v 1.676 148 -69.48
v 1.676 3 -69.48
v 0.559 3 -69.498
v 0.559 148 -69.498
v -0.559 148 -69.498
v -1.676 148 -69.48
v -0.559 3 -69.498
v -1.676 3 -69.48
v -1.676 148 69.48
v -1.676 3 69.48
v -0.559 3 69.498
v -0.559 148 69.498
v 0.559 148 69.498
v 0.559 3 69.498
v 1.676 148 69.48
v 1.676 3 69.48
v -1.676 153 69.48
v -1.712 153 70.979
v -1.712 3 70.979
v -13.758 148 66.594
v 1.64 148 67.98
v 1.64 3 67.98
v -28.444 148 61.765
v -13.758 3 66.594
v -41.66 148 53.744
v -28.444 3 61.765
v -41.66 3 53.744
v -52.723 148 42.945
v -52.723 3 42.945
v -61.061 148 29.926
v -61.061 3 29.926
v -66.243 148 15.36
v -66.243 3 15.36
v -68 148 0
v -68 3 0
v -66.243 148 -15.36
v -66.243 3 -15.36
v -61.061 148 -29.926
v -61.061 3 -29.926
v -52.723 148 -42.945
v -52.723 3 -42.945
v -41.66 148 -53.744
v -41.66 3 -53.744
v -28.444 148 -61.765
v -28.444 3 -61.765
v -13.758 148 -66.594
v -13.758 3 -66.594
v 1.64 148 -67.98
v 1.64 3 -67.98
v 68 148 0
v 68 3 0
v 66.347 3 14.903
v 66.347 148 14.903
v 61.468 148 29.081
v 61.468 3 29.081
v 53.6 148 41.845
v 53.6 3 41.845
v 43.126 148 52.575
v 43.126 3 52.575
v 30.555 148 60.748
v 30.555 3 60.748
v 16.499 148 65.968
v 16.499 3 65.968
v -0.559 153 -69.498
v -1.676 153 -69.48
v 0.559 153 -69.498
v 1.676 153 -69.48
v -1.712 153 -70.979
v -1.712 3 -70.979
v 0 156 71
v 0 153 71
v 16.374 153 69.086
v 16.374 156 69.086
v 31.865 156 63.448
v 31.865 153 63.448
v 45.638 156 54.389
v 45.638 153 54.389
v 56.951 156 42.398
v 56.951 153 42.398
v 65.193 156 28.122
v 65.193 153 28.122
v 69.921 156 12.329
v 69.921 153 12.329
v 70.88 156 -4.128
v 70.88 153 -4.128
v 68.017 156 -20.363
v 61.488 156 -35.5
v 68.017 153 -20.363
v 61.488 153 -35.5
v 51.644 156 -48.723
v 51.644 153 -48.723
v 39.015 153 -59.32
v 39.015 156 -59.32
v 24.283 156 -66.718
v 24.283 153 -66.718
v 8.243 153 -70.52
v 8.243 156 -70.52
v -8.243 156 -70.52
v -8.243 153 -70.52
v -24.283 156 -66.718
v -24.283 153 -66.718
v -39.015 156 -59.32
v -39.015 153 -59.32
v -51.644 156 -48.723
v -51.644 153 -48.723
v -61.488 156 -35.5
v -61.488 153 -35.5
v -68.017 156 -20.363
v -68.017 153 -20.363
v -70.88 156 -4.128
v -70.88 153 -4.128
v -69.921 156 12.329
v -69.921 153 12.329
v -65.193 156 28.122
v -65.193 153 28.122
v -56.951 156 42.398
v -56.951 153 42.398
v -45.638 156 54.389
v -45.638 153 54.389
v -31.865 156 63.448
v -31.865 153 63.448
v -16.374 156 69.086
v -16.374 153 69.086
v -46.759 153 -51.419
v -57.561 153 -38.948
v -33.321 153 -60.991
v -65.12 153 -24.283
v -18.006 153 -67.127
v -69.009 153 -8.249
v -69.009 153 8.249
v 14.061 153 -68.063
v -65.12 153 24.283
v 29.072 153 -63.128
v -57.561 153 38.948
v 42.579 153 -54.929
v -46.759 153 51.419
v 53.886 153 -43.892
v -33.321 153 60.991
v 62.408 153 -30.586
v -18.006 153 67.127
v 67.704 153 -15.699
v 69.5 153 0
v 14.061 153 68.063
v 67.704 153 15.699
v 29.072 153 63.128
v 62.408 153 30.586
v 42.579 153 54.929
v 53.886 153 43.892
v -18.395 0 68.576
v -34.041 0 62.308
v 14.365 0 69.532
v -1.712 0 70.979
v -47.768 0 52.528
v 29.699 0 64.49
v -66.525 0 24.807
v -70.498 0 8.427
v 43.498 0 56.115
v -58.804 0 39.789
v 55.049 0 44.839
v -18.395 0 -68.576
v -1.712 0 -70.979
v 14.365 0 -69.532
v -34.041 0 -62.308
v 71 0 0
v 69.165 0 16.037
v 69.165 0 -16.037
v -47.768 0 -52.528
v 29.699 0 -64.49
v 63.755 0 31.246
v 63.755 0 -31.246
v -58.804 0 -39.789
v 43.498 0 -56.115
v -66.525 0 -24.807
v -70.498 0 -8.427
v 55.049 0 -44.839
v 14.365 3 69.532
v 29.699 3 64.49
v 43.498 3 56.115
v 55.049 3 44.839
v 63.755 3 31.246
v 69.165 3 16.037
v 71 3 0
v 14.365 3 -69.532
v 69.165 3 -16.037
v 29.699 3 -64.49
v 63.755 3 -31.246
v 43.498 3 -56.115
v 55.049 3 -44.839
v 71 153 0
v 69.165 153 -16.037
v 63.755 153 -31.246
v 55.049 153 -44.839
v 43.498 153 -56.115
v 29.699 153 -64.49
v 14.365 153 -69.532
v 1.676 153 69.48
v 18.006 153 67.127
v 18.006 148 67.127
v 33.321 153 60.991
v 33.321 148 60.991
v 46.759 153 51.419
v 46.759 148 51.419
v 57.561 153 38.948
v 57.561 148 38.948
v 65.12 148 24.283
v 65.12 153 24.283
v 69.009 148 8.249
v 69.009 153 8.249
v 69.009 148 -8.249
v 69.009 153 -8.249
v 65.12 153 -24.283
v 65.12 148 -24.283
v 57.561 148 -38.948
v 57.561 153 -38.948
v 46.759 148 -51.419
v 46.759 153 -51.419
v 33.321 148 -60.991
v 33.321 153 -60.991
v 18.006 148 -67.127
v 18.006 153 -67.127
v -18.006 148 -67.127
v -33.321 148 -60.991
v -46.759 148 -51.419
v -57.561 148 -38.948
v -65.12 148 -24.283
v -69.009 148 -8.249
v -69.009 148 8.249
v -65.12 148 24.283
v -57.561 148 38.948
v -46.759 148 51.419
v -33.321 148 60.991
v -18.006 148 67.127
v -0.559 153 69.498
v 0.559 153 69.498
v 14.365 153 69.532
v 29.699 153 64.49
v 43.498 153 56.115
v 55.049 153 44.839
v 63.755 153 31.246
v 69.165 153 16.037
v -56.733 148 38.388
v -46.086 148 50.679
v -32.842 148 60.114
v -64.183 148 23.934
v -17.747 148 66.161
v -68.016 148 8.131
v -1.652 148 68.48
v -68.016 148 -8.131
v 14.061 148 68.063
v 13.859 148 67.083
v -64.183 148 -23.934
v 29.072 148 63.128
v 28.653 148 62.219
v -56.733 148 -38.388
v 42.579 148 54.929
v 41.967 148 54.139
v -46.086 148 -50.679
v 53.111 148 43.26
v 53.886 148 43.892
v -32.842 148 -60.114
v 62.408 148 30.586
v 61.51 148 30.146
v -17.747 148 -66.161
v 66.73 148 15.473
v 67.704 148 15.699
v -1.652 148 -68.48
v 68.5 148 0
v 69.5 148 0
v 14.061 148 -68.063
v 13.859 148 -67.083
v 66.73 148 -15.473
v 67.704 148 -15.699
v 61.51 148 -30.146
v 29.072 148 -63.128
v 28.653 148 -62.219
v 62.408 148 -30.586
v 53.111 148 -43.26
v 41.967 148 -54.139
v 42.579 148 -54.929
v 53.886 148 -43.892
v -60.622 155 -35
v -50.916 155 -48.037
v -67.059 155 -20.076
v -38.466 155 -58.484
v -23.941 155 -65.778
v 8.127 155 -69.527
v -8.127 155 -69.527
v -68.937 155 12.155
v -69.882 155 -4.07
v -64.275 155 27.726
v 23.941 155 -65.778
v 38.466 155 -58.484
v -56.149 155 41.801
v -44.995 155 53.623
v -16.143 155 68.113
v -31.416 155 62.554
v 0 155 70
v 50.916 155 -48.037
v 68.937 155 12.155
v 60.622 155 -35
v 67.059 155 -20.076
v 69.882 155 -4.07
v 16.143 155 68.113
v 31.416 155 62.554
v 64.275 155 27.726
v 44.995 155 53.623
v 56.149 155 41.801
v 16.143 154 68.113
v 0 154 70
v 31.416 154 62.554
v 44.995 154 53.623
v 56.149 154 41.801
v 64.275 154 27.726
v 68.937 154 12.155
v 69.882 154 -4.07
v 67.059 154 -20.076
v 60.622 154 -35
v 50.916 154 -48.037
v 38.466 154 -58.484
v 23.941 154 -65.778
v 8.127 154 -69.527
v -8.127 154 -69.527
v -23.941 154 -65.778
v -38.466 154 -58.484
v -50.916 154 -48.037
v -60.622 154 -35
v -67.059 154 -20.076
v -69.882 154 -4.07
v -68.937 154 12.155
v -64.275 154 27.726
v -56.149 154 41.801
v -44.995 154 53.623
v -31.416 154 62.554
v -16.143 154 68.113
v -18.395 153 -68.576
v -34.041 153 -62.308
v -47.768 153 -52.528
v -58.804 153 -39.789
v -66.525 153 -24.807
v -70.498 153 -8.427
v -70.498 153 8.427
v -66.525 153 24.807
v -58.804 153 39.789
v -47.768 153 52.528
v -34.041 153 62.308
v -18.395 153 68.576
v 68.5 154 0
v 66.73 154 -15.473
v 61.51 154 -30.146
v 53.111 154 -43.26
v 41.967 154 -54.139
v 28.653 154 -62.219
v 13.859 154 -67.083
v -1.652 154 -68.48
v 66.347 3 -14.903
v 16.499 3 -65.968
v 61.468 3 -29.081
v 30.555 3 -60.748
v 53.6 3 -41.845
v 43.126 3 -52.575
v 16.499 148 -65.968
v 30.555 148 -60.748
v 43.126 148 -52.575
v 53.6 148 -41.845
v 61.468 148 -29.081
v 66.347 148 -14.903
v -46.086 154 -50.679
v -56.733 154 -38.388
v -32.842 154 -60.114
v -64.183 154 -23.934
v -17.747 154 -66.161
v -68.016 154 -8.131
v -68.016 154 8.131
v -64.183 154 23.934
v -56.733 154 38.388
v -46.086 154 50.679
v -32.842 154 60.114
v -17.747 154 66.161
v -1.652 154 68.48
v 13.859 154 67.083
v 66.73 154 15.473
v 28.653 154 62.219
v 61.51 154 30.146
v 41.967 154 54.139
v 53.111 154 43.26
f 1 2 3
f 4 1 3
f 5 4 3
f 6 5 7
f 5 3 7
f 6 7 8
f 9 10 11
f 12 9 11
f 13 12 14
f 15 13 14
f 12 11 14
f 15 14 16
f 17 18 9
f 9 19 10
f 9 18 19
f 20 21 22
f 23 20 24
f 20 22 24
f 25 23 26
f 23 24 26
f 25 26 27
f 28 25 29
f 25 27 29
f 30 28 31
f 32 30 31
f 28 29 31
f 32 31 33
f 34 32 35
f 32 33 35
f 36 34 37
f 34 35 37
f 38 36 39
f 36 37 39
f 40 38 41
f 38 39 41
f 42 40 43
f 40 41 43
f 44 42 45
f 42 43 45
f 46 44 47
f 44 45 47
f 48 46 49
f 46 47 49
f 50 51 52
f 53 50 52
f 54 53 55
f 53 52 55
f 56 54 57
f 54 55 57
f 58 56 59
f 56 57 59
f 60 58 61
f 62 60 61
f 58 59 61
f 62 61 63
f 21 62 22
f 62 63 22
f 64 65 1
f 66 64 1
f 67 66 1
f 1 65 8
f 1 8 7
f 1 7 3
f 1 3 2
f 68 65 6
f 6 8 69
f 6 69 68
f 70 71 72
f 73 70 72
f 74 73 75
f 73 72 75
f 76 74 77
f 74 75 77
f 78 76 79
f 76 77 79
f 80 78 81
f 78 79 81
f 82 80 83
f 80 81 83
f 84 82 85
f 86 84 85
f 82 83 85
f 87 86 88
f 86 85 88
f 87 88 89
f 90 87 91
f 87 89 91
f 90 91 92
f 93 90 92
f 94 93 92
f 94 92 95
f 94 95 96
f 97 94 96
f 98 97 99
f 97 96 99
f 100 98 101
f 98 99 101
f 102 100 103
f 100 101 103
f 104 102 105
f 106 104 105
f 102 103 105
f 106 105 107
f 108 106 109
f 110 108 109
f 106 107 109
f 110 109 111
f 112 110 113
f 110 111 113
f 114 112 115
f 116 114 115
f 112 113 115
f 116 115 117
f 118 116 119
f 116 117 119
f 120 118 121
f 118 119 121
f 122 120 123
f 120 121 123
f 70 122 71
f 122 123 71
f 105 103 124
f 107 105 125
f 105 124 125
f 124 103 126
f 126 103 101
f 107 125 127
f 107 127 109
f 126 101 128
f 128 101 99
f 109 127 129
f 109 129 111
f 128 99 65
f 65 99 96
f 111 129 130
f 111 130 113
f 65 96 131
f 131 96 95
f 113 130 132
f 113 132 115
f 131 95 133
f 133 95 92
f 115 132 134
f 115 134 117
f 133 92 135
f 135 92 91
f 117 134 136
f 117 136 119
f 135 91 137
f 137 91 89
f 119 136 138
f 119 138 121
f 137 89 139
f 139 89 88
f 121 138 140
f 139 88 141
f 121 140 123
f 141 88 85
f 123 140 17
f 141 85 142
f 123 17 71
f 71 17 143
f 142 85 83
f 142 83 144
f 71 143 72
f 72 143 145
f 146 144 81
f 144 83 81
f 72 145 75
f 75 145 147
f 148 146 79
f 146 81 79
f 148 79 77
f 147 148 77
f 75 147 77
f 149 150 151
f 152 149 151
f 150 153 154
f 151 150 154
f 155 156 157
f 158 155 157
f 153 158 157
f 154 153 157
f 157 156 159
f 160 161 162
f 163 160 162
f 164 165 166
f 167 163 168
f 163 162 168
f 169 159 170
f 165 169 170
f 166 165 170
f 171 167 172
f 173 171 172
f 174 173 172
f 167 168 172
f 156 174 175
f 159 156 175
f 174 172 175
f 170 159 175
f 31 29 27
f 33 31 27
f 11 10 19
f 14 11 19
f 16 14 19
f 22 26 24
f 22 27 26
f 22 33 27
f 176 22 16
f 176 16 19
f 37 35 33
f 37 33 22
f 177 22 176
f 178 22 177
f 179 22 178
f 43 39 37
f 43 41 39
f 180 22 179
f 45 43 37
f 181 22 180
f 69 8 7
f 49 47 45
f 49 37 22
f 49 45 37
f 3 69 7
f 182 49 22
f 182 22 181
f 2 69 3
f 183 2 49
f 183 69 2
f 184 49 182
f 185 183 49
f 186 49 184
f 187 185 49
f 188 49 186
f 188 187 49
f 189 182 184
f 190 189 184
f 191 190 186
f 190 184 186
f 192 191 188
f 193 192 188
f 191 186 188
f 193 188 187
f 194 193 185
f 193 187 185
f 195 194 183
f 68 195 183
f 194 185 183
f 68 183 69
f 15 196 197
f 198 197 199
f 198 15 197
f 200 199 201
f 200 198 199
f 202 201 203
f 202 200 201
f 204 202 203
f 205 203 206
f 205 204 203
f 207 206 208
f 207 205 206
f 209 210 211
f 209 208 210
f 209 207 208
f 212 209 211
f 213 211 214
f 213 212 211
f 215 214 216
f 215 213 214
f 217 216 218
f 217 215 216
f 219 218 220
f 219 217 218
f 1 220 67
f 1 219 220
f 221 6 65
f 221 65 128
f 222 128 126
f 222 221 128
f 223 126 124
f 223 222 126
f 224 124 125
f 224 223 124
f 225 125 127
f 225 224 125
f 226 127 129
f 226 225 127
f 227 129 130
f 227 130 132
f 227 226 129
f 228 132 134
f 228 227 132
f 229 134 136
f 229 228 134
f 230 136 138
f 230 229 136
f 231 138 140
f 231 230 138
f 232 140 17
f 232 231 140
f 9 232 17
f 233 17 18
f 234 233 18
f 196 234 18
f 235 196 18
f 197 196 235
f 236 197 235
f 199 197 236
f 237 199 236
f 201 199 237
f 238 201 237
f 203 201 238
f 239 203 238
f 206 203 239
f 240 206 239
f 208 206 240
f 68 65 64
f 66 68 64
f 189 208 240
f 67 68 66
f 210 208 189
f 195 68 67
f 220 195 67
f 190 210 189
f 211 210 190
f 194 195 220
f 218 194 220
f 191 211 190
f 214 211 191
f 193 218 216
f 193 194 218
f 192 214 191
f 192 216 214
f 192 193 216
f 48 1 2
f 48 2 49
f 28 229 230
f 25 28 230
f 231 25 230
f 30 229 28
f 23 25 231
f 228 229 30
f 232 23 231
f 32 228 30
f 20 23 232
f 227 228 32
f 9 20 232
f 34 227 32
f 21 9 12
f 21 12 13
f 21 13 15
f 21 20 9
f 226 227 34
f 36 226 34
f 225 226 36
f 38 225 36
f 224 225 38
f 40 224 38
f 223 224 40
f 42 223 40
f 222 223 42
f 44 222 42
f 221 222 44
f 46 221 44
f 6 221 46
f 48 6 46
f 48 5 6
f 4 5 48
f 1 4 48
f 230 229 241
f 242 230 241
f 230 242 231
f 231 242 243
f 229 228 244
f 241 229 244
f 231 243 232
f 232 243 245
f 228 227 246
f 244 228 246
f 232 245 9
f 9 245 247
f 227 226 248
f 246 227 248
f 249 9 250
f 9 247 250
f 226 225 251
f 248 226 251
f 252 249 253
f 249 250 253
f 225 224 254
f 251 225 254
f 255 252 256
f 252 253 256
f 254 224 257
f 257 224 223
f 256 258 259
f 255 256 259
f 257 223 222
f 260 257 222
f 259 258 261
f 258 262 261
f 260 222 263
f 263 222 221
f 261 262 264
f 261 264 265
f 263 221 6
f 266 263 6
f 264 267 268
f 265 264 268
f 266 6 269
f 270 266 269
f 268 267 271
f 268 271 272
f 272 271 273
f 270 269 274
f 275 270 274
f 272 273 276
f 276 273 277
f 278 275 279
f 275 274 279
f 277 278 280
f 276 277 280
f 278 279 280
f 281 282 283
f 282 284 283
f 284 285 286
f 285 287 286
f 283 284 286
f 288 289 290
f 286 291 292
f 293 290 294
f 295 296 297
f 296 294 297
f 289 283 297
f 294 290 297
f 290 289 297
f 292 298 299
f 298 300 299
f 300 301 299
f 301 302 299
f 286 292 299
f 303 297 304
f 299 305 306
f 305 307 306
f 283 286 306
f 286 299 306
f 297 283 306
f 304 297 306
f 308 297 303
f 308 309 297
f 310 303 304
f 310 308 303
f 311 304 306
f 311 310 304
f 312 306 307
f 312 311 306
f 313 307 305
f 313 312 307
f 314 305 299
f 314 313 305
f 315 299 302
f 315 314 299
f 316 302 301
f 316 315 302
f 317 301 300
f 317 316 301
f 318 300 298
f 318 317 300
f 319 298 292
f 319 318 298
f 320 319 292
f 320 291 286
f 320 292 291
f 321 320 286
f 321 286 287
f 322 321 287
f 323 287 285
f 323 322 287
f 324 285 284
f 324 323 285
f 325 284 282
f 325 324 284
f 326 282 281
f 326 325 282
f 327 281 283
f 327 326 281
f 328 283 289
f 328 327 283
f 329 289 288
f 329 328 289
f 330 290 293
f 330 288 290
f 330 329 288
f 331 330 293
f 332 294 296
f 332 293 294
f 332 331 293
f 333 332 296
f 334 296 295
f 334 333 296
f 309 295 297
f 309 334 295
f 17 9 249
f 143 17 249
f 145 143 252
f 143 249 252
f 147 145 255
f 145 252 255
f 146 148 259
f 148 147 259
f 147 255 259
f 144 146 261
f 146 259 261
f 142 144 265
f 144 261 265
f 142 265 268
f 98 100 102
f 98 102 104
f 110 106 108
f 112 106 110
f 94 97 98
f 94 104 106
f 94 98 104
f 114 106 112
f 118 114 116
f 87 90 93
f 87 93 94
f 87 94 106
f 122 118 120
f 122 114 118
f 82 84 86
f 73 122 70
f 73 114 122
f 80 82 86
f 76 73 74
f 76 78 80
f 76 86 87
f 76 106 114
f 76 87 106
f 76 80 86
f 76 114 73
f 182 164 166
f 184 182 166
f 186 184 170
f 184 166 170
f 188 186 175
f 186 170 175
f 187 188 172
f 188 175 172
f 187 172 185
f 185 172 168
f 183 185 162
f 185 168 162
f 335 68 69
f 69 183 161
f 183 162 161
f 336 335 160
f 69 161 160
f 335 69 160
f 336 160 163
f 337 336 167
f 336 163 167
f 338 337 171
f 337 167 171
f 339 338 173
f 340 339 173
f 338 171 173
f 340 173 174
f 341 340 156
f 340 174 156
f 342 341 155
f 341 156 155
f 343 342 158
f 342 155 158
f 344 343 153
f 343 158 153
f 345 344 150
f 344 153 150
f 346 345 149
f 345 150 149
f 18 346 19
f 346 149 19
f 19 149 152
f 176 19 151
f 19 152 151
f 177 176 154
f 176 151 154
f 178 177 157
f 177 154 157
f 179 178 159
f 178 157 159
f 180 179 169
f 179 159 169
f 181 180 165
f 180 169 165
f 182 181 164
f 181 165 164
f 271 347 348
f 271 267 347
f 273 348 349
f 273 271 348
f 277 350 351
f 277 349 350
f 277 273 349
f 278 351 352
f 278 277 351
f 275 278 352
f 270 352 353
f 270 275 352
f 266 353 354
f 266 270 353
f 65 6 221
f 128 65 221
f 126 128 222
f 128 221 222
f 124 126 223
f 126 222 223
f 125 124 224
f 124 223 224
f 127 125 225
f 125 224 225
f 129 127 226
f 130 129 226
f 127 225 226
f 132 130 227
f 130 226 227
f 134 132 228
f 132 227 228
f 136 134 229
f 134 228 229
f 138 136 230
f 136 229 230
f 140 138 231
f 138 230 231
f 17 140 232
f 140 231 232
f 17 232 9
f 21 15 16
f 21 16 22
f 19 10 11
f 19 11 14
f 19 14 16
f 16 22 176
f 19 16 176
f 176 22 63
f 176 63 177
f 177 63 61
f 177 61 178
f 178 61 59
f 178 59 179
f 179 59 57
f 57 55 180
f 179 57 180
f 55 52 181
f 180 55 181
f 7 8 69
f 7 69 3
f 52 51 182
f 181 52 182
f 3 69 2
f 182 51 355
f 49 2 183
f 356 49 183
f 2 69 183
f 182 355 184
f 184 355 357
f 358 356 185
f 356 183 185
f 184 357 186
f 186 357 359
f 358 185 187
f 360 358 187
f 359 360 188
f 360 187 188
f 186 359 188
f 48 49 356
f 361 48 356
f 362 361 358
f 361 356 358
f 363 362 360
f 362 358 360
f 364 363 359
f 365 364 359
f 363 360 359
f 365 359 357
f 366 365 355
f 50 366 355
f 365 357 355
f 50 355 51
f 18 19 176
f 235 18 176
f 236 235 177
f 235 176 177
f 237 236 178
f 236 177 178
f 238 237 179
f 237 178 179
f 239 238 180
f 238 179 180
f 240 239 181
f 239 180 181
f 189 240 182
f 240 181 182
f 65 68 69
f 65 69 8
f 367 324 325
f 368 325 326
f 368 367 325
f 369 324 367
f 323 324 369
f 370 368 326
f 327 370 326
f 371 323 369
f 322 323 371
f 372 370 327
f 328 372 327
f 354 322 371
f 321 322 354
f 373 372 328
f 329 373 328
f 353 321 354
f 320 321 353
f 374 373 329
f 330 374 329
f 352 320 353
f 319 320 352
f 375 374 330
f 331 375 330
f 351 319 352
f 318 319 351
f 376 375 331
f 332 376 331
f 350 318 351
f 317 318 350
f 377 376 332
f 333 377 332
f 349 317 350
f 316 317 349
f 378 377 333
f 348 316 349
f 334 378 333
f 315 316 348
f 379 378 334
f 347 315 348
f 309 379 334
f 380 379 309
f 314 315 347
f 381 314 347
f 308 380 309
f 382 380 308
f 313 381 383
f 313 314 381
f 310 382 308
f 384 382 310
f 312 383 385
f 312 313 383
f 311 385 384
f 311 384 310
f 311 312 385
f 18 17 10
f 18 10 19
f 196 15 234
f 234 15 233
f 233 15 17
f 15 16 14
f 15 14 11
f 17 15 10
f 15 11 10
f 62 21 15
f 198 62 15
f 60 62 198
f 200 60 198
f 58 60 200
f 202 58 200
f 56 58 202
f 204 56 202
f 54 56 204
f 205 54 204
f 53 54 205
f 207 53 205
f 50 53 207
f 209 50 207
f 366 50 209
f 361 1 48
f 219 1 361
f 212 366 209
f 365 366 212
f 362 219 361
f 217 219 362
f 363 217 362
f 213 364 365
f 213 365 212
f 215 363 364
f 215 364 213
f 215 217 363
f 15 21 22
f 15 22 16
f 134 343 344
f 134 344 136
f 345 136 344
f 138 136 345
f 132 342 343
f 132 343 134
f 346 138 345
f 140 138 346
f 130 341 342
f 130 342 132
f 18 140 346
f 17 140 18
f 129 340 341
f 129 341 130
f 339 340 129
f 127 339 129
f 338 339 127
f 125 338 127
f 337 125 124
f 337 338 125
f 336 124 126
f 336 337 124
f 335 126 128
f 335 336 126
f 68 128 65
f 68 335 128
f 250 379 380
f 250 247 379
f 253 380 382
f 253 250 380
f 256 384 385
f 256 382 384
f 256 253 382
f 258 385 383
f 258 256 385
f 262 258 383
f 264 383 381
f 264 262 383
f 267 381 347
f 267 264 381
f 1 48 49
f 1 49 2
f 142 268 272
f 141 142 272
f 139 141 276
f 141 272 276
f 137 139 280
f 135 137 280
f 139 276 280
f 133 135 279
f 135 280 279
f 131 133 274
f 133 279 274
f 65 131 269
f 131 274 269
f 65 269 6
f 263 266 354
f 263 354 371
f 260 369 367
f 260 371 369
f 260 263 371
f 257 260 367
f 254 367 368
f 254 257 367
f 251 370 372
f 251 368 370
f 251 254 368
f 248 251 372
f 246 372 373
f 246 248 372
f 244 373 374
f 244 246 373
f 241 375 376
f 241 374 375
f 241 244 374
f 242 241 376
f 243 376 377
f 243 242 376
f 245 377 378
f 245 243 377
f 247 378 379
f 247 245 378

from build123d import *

# Parameters (mm, degrees)
SKETCH_474_R        = 68
EXTRUDE_7_DEPTH     = 3
EXTRUDE_START       = 3
EXTRUDE_8_DEPTH     = 150
EXTRUDE_9_DEPTH     = 150
CUT_EXTRUDE_START   = -5
SKETCH_7_R          = 69.5
CUT_EXTRUDE_2_DEPTH = 5
SKETCH_8_R          = 71
SKETCH_8_R_2        = 69.5
EXTRUDE_11_DEPTH    = 3
EXTRUDE_START_2     = -5
EXTRUDE_14_DEPTH    = 8
SHELL_4_T           = -1


with BuildPart() as part:
    # Sketch 474 → 填料-伸長7 (new body)
    with BuildSketch(Plane(origin=(0, 0, 0), x_dir=(1, 0, 0), z_dir=(0, 1, 0))):
        Circle(SKETCH_474_R)
        with BuildLine():
            ThreePointArc((1.676303744, 69.479781273), (0, 69.5), (-1.676303744, 69.479781273))
            Line((-1.676303744, 69.479781273), (-1.712482962, 70.979344898))
            ThreePointArc((-1.712482962, 70.979344898), (-71, 0), (-1.712482962, -70.979344898))
            Line((-1.712482962, -70.979344898), (-1.676303744, -69.479781273))
            ThreePointArc((-1.676303744, -69.479781273), (0, -69.5), (1.676303744, -69.479781273))
            Line((1.676303744, -69.479781273), (1.640124527, -67.980217648))
            ThreePointArc((1.640124527, -67.980217648), (-68, 0), (1.640124527, 67.980217648))
            Line((1.640124527, 67.980217648), (1.676303744, 69.479781273))
        make_face()
        with BuildLine():
            Line((-1.712482962, 70.979344898), (-1.676303744, 69.479781273))
            ThreePointArc((-1.676303744, 69.479781273), (0, 69.5), (1.676303744, 69.479781273))
            Line((1.676303744, 69.479781273), (1.640124527, 67.980217648))
            ThreePointArc((1.640124527, 67.980217648), (48.6596777, 47.499850169), (68, 0))
            ThreePointArc((68, 0), (48.6596777, -47.499850169), (1.640124527, -67.980217648))
            Line((1.640124527, -67.980217648), (1.676303744, -69.479781273))
            ThreePointArc((1.676303744, -69.479781273), (0, -69.5), (-1.676303744, -69.479781273))
            Line((-1.676303744, -69.479781273), (-1.712482962, -70.979344898))
            ThreePointArc((-1.712482962, -70.979344898), (49.595431794, -50.806428187), (71, 0))
            ThreePointArc((71, 0), (49.595431794, 50.806428187), (-1.712482962, 70.979344898))
        make_face()
    extrude(amount=EXTRUDE_7_DEPTH)

    # 底座<9> → 填料-伸長8 (add)
    with BuildSketch(Plane(origin=(0, 0, 0), x_dir=(1, 0, 0), z_dir=(0, 1, 0)).offset(EXTRUDE_START)):
        with BuildLine():
            ThreePointArc((1.676303744, 69.479781273), (0, 69.5), (-1.676303744, 69.479781273))
            Line((-1.676303744, 69.479781273), (-1.712482962, 70.979344898))
            ThreePointArc((-1.712482962, 70.979344898), (-71, 0), (-1.712482962, -70.979344898))
            Line((-1.712482962, -70.979344898), (-1.676303744, -69.479781273))
            ThreePointArc((-1.676303744, -69.479781273), (0, -69.5), (1.676303744, -69.479781273))
            Line((1.676303744, -69.479781273), (1.640124527, -67.980217648))
            ThreePointArc((1.640124527, -67.980217648), (-68, 0), (1.640124527, 67.980217648))
            Line((1.640124527, 67.980217648), (1.676303744, 69.479781273))
        make_face()
    extrude(amount=EXTRUDE_8_DEPTH)


with BuildPart() as body_2:
    # 底座<10> → 填料-伸長9 (new body)
    with BuildSketch(Plane(origin=(0, 0, 0), x_dir=(1, 0, 0), z_dir=(0, 1, 0)).offset(EXTRUDE_START)):
        with BuildLine():
            Line((-1.712482962, 70.979344898), (-1.676303744, 69.479781273))
            ThreePointArc((-1.676303744, 69.479781273), (0, 69.5), (1.676303744, 69.479781273))
            Line((1.676303744, 69.479781273), (1.640124527, 67.980217648))
            ThreePointArc((1.640124527, 67.980217648), (48.6596777, 47.499850169), (68, 0))
            ThreePointArc((68, 0), (48.6596777, -47.499850169), (1.640124527, -67.980217648))
            Line((1.640124527, -67.980217648), (1.676303744, -69.479781273))
            ThreePointArc((1.676303744, -69.479781273), (0, -69.5), (-1.676303744, -69.479781273))
            Line((-1.676303744, -69.479781273), (-1.712482962, -70.979344898))
            ThreePointArc((-1.712482962, -70.979344898), (49.595431794, -50.806428187), (71, 0))
            ThreePointArc((71, 0), (49.595431794, 50.806428187), (-1.712482962, 70.979344898))
        make_face()
    extrude(amount=EXTRUDE_9_DEPTH)


with BuildPart() as cut_extrude_2_tool:
    # 草圖7 → 除料-伸長2 (new body)
    with BuildSketch(Plane(origin=(0, 153, 0), x_dir=(1, 0, 0), z_dir=(0, 1, 0)).offset(CUT_EXTRUDE_START)):
        Circle(SKETCH_7_R)
    extrude(amount=CUT_EXTRUDE_2_DEPTH)


with BuildPart() as part_1:
    add(part.part)

    # 除料-伸長2: cut by cut_extrude_2_tool
    add(cut_extrude_2_tool.part, mode=Mode.SUBTRACT)


with BuildPart() as body_2_1:
    add(body_2.part)

    # 除料-伸長2: cut by cut_extrude_2_tool
    add(cut_extrude_2_tool.part, mode=Mode.SUBTRACT)


with BuildPart() as body_3:
    # 草圖8 → 填料-伸長11 (new body)
    with BuildSketch(Plane(origin=(0, 153, 0), x_dir=(1, 0, 0), z_dir=(0, 1, 0))):
        with Locations(Location((0, 0, 0), (0, 0, 270))):
            Circle(SKETCH_8_R)
        with Locations(Location((0, 0, 0), (0, 0, 270))):
            Circle(SKETCH_8_R_2, mode=Mode.SUBTRACT)
    extrude(amount=EXTRUDE_11_DEPTH)

    # 草圖8<7> → 填料-伸長14 (add)
    with BuildSketch(Plane(origin=(0, 153, 0), x_dir=(1, 0, 0), z_dir=(0, 1, 0)).offset(EXTRUDE_START_2)):
        with BuildLine():
            ThreePointArc((-1.676303744, -69.479781273), (48.547640982, -49.733052944), (69.5, 0))
            ThreePointArc((69.5, 0), (48.547640982, 49.733052944), (-1.676303744, 69.479781273))
            ThreePointArc((-1.676303744, 69.479781273), (-69.5, 0), (-1.676303744, -69.479781273))
        make_face()
    extrude(amount=EXTRUDE_14_DEPTH)

    # 薄殼4
    shell_4_openings = [body_3.faces().sort_by_distance(p)[0] for p in [
        (0, 148, 0),
    ]]
    offset(amount=SHELL_4_T, openings=shell_4_openings, kind=Kind.INTERSECTION)


solid = Compound([part_1.part, body_2_1.part, body_3.part])
